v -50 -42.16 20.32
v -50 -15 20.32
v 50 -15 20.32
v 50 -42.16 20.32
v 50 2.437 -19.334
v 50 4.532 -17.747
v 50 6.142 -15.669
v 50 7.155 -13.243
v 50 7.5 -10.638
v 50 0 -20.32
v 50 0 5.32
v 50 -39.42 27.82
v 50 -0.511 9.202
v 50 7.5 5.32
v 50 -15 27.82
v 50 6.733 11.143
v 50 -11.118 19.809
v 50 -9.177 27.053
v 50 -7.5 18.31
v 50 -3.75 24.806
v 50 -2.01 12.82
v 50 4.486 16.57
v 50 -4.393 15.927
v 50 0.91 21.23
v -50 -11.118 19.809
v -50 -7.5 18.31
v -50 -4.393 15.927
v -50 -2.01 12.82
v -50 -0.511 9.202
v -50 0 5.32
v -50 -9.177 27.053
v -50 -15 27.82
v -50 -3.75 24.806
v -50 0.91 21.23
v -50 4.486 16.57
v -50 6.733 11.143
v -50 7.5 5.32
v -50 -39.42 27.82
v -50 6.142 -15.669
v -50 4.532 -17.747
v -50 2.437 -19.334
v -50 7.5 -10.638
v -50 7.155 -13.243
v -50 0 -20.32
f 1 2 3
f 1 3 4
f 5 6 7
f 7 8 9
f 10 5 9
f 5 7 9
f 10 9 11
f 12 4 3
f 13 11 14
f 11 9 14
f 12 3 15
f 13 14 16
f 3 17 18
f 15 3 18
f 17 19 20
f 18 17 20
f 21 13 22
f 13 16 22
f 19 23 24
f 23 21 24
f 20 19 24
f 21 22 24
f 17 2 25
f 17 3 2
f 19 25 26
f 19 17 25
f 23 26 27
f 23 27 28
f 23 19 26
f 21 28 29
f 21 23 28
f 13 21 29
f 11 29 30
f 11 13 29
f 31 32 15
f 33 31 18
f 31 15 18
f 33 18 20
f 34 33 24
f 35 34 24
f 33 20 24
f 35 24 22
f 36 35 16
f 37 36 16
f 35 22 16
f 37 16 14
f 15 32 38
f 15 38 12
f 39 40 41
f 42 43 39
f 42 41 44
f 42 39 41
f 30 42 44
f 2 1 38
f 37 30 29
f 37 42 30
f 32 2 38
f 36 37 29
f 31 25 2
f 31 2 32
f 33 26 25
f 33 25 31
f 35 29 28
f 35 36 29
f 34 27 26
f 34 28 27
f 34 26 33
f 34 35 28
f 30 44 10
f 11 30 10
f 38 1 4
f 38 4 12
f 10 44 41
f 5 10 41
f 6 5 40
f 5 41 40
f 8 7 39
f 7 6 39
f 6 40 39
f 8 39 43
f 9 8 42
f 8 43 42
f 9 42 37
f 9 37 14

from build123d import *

# Parameters (mm, degrees)
SKETCH1_W           = 100
SKETCH1_H           = 40.64
BOSS_EXTRUDE1_DEPTH = 7.5
SKETCH2_W           = 100
SKETCH2_H           = 7.5
BOSS_EXTRUDE2_DEPTH = 46.92
BOSS_EXTRUDE3_DEPTH = 100
FILLET1_R           = 10
FILLET2_R           = 15
FILLET3_R           = 22.5


with BuildPart() as part:
    # Sketch1 → Boss-Extrude1 (new body)
    with BuildSketch(Plane(origin=(0, 0, 0), x_dir=(1, 0, 0), z_dir=(0, 1, 0))):
        Rectangle(SKETCH1_W, SKETCH1_H)
    extrude(amount=BOSS_EXTRUDE1_DEPTH)

    # Sketch2 → Boss-Extrude2 (add)
    with BuildSketch(Plane(origin=(0, 7.5, 0), x_dir=(1, 0, 0), z_dir=(0, 1, 0))):
        with Locations((0, -24.07)):
            Rectangle(SKETCH2_W, SKETCH2_H)
    extrude(amount=-BOSS_EXTRUDE2_DEPTH)

    # Sketch3 → Boss-Extrude3 (add)
    with BuildSketch(Plane.ZY.offset(50)):
        Polygon((20.32, -39.42), (20.32, -42.16), (27.82, -39.42), (27.82, -32.266971567), (20.32, -32.266971567), align=None)
    extrude(amount=-BOSS_EXTRUDE3_DEPTH)

    # Fillet1
    # the kernel refuses this fillet: 10 mm, written as the material it takes off along each edge
    with BuildSketch(Plane(origin=(-74.206145914, 7.5, -20.32), x_dir=(0, -1, 0), z_dir=(1, 0, 0))) as fillet1_piece_1:
        with BuildLine():
            CenterArc((10, -9.682458366), FILLET1_R, 104.477512186, 75.522487814)
            Line((0, -9.682458366), (-0.2, -9.682458366))
            Line((-0.2, -9.682458366), (-0.2, 0))
            Line((-0.2, 0), (0, 0.2))
            ThreePointArc((0, 0.2), (3.75, 0.2), (7.45, 0.193649167))
            Line((7.45, 0.193649167), (7.5, 0))
        make_face()
    extrude(amount=148.412291828, mode=Mode.SUBTRACT)

    # Fillet2
    fillet2_edges = [part.edges().sort_by_distance(p)[0] for p in [
        (0, 0, 20.32),
    ]]
    fillet(fillet2_edges, radius=FILLET2_R)

    # Fillet3
    fillet3_edges = [part.edges().sort_by_distance(p)[0] for p in [
        (0, 7.5, 27.82),
    ]]
    fillet(fillet3_edges, radius=FILLET3_R)


solid = part.part
